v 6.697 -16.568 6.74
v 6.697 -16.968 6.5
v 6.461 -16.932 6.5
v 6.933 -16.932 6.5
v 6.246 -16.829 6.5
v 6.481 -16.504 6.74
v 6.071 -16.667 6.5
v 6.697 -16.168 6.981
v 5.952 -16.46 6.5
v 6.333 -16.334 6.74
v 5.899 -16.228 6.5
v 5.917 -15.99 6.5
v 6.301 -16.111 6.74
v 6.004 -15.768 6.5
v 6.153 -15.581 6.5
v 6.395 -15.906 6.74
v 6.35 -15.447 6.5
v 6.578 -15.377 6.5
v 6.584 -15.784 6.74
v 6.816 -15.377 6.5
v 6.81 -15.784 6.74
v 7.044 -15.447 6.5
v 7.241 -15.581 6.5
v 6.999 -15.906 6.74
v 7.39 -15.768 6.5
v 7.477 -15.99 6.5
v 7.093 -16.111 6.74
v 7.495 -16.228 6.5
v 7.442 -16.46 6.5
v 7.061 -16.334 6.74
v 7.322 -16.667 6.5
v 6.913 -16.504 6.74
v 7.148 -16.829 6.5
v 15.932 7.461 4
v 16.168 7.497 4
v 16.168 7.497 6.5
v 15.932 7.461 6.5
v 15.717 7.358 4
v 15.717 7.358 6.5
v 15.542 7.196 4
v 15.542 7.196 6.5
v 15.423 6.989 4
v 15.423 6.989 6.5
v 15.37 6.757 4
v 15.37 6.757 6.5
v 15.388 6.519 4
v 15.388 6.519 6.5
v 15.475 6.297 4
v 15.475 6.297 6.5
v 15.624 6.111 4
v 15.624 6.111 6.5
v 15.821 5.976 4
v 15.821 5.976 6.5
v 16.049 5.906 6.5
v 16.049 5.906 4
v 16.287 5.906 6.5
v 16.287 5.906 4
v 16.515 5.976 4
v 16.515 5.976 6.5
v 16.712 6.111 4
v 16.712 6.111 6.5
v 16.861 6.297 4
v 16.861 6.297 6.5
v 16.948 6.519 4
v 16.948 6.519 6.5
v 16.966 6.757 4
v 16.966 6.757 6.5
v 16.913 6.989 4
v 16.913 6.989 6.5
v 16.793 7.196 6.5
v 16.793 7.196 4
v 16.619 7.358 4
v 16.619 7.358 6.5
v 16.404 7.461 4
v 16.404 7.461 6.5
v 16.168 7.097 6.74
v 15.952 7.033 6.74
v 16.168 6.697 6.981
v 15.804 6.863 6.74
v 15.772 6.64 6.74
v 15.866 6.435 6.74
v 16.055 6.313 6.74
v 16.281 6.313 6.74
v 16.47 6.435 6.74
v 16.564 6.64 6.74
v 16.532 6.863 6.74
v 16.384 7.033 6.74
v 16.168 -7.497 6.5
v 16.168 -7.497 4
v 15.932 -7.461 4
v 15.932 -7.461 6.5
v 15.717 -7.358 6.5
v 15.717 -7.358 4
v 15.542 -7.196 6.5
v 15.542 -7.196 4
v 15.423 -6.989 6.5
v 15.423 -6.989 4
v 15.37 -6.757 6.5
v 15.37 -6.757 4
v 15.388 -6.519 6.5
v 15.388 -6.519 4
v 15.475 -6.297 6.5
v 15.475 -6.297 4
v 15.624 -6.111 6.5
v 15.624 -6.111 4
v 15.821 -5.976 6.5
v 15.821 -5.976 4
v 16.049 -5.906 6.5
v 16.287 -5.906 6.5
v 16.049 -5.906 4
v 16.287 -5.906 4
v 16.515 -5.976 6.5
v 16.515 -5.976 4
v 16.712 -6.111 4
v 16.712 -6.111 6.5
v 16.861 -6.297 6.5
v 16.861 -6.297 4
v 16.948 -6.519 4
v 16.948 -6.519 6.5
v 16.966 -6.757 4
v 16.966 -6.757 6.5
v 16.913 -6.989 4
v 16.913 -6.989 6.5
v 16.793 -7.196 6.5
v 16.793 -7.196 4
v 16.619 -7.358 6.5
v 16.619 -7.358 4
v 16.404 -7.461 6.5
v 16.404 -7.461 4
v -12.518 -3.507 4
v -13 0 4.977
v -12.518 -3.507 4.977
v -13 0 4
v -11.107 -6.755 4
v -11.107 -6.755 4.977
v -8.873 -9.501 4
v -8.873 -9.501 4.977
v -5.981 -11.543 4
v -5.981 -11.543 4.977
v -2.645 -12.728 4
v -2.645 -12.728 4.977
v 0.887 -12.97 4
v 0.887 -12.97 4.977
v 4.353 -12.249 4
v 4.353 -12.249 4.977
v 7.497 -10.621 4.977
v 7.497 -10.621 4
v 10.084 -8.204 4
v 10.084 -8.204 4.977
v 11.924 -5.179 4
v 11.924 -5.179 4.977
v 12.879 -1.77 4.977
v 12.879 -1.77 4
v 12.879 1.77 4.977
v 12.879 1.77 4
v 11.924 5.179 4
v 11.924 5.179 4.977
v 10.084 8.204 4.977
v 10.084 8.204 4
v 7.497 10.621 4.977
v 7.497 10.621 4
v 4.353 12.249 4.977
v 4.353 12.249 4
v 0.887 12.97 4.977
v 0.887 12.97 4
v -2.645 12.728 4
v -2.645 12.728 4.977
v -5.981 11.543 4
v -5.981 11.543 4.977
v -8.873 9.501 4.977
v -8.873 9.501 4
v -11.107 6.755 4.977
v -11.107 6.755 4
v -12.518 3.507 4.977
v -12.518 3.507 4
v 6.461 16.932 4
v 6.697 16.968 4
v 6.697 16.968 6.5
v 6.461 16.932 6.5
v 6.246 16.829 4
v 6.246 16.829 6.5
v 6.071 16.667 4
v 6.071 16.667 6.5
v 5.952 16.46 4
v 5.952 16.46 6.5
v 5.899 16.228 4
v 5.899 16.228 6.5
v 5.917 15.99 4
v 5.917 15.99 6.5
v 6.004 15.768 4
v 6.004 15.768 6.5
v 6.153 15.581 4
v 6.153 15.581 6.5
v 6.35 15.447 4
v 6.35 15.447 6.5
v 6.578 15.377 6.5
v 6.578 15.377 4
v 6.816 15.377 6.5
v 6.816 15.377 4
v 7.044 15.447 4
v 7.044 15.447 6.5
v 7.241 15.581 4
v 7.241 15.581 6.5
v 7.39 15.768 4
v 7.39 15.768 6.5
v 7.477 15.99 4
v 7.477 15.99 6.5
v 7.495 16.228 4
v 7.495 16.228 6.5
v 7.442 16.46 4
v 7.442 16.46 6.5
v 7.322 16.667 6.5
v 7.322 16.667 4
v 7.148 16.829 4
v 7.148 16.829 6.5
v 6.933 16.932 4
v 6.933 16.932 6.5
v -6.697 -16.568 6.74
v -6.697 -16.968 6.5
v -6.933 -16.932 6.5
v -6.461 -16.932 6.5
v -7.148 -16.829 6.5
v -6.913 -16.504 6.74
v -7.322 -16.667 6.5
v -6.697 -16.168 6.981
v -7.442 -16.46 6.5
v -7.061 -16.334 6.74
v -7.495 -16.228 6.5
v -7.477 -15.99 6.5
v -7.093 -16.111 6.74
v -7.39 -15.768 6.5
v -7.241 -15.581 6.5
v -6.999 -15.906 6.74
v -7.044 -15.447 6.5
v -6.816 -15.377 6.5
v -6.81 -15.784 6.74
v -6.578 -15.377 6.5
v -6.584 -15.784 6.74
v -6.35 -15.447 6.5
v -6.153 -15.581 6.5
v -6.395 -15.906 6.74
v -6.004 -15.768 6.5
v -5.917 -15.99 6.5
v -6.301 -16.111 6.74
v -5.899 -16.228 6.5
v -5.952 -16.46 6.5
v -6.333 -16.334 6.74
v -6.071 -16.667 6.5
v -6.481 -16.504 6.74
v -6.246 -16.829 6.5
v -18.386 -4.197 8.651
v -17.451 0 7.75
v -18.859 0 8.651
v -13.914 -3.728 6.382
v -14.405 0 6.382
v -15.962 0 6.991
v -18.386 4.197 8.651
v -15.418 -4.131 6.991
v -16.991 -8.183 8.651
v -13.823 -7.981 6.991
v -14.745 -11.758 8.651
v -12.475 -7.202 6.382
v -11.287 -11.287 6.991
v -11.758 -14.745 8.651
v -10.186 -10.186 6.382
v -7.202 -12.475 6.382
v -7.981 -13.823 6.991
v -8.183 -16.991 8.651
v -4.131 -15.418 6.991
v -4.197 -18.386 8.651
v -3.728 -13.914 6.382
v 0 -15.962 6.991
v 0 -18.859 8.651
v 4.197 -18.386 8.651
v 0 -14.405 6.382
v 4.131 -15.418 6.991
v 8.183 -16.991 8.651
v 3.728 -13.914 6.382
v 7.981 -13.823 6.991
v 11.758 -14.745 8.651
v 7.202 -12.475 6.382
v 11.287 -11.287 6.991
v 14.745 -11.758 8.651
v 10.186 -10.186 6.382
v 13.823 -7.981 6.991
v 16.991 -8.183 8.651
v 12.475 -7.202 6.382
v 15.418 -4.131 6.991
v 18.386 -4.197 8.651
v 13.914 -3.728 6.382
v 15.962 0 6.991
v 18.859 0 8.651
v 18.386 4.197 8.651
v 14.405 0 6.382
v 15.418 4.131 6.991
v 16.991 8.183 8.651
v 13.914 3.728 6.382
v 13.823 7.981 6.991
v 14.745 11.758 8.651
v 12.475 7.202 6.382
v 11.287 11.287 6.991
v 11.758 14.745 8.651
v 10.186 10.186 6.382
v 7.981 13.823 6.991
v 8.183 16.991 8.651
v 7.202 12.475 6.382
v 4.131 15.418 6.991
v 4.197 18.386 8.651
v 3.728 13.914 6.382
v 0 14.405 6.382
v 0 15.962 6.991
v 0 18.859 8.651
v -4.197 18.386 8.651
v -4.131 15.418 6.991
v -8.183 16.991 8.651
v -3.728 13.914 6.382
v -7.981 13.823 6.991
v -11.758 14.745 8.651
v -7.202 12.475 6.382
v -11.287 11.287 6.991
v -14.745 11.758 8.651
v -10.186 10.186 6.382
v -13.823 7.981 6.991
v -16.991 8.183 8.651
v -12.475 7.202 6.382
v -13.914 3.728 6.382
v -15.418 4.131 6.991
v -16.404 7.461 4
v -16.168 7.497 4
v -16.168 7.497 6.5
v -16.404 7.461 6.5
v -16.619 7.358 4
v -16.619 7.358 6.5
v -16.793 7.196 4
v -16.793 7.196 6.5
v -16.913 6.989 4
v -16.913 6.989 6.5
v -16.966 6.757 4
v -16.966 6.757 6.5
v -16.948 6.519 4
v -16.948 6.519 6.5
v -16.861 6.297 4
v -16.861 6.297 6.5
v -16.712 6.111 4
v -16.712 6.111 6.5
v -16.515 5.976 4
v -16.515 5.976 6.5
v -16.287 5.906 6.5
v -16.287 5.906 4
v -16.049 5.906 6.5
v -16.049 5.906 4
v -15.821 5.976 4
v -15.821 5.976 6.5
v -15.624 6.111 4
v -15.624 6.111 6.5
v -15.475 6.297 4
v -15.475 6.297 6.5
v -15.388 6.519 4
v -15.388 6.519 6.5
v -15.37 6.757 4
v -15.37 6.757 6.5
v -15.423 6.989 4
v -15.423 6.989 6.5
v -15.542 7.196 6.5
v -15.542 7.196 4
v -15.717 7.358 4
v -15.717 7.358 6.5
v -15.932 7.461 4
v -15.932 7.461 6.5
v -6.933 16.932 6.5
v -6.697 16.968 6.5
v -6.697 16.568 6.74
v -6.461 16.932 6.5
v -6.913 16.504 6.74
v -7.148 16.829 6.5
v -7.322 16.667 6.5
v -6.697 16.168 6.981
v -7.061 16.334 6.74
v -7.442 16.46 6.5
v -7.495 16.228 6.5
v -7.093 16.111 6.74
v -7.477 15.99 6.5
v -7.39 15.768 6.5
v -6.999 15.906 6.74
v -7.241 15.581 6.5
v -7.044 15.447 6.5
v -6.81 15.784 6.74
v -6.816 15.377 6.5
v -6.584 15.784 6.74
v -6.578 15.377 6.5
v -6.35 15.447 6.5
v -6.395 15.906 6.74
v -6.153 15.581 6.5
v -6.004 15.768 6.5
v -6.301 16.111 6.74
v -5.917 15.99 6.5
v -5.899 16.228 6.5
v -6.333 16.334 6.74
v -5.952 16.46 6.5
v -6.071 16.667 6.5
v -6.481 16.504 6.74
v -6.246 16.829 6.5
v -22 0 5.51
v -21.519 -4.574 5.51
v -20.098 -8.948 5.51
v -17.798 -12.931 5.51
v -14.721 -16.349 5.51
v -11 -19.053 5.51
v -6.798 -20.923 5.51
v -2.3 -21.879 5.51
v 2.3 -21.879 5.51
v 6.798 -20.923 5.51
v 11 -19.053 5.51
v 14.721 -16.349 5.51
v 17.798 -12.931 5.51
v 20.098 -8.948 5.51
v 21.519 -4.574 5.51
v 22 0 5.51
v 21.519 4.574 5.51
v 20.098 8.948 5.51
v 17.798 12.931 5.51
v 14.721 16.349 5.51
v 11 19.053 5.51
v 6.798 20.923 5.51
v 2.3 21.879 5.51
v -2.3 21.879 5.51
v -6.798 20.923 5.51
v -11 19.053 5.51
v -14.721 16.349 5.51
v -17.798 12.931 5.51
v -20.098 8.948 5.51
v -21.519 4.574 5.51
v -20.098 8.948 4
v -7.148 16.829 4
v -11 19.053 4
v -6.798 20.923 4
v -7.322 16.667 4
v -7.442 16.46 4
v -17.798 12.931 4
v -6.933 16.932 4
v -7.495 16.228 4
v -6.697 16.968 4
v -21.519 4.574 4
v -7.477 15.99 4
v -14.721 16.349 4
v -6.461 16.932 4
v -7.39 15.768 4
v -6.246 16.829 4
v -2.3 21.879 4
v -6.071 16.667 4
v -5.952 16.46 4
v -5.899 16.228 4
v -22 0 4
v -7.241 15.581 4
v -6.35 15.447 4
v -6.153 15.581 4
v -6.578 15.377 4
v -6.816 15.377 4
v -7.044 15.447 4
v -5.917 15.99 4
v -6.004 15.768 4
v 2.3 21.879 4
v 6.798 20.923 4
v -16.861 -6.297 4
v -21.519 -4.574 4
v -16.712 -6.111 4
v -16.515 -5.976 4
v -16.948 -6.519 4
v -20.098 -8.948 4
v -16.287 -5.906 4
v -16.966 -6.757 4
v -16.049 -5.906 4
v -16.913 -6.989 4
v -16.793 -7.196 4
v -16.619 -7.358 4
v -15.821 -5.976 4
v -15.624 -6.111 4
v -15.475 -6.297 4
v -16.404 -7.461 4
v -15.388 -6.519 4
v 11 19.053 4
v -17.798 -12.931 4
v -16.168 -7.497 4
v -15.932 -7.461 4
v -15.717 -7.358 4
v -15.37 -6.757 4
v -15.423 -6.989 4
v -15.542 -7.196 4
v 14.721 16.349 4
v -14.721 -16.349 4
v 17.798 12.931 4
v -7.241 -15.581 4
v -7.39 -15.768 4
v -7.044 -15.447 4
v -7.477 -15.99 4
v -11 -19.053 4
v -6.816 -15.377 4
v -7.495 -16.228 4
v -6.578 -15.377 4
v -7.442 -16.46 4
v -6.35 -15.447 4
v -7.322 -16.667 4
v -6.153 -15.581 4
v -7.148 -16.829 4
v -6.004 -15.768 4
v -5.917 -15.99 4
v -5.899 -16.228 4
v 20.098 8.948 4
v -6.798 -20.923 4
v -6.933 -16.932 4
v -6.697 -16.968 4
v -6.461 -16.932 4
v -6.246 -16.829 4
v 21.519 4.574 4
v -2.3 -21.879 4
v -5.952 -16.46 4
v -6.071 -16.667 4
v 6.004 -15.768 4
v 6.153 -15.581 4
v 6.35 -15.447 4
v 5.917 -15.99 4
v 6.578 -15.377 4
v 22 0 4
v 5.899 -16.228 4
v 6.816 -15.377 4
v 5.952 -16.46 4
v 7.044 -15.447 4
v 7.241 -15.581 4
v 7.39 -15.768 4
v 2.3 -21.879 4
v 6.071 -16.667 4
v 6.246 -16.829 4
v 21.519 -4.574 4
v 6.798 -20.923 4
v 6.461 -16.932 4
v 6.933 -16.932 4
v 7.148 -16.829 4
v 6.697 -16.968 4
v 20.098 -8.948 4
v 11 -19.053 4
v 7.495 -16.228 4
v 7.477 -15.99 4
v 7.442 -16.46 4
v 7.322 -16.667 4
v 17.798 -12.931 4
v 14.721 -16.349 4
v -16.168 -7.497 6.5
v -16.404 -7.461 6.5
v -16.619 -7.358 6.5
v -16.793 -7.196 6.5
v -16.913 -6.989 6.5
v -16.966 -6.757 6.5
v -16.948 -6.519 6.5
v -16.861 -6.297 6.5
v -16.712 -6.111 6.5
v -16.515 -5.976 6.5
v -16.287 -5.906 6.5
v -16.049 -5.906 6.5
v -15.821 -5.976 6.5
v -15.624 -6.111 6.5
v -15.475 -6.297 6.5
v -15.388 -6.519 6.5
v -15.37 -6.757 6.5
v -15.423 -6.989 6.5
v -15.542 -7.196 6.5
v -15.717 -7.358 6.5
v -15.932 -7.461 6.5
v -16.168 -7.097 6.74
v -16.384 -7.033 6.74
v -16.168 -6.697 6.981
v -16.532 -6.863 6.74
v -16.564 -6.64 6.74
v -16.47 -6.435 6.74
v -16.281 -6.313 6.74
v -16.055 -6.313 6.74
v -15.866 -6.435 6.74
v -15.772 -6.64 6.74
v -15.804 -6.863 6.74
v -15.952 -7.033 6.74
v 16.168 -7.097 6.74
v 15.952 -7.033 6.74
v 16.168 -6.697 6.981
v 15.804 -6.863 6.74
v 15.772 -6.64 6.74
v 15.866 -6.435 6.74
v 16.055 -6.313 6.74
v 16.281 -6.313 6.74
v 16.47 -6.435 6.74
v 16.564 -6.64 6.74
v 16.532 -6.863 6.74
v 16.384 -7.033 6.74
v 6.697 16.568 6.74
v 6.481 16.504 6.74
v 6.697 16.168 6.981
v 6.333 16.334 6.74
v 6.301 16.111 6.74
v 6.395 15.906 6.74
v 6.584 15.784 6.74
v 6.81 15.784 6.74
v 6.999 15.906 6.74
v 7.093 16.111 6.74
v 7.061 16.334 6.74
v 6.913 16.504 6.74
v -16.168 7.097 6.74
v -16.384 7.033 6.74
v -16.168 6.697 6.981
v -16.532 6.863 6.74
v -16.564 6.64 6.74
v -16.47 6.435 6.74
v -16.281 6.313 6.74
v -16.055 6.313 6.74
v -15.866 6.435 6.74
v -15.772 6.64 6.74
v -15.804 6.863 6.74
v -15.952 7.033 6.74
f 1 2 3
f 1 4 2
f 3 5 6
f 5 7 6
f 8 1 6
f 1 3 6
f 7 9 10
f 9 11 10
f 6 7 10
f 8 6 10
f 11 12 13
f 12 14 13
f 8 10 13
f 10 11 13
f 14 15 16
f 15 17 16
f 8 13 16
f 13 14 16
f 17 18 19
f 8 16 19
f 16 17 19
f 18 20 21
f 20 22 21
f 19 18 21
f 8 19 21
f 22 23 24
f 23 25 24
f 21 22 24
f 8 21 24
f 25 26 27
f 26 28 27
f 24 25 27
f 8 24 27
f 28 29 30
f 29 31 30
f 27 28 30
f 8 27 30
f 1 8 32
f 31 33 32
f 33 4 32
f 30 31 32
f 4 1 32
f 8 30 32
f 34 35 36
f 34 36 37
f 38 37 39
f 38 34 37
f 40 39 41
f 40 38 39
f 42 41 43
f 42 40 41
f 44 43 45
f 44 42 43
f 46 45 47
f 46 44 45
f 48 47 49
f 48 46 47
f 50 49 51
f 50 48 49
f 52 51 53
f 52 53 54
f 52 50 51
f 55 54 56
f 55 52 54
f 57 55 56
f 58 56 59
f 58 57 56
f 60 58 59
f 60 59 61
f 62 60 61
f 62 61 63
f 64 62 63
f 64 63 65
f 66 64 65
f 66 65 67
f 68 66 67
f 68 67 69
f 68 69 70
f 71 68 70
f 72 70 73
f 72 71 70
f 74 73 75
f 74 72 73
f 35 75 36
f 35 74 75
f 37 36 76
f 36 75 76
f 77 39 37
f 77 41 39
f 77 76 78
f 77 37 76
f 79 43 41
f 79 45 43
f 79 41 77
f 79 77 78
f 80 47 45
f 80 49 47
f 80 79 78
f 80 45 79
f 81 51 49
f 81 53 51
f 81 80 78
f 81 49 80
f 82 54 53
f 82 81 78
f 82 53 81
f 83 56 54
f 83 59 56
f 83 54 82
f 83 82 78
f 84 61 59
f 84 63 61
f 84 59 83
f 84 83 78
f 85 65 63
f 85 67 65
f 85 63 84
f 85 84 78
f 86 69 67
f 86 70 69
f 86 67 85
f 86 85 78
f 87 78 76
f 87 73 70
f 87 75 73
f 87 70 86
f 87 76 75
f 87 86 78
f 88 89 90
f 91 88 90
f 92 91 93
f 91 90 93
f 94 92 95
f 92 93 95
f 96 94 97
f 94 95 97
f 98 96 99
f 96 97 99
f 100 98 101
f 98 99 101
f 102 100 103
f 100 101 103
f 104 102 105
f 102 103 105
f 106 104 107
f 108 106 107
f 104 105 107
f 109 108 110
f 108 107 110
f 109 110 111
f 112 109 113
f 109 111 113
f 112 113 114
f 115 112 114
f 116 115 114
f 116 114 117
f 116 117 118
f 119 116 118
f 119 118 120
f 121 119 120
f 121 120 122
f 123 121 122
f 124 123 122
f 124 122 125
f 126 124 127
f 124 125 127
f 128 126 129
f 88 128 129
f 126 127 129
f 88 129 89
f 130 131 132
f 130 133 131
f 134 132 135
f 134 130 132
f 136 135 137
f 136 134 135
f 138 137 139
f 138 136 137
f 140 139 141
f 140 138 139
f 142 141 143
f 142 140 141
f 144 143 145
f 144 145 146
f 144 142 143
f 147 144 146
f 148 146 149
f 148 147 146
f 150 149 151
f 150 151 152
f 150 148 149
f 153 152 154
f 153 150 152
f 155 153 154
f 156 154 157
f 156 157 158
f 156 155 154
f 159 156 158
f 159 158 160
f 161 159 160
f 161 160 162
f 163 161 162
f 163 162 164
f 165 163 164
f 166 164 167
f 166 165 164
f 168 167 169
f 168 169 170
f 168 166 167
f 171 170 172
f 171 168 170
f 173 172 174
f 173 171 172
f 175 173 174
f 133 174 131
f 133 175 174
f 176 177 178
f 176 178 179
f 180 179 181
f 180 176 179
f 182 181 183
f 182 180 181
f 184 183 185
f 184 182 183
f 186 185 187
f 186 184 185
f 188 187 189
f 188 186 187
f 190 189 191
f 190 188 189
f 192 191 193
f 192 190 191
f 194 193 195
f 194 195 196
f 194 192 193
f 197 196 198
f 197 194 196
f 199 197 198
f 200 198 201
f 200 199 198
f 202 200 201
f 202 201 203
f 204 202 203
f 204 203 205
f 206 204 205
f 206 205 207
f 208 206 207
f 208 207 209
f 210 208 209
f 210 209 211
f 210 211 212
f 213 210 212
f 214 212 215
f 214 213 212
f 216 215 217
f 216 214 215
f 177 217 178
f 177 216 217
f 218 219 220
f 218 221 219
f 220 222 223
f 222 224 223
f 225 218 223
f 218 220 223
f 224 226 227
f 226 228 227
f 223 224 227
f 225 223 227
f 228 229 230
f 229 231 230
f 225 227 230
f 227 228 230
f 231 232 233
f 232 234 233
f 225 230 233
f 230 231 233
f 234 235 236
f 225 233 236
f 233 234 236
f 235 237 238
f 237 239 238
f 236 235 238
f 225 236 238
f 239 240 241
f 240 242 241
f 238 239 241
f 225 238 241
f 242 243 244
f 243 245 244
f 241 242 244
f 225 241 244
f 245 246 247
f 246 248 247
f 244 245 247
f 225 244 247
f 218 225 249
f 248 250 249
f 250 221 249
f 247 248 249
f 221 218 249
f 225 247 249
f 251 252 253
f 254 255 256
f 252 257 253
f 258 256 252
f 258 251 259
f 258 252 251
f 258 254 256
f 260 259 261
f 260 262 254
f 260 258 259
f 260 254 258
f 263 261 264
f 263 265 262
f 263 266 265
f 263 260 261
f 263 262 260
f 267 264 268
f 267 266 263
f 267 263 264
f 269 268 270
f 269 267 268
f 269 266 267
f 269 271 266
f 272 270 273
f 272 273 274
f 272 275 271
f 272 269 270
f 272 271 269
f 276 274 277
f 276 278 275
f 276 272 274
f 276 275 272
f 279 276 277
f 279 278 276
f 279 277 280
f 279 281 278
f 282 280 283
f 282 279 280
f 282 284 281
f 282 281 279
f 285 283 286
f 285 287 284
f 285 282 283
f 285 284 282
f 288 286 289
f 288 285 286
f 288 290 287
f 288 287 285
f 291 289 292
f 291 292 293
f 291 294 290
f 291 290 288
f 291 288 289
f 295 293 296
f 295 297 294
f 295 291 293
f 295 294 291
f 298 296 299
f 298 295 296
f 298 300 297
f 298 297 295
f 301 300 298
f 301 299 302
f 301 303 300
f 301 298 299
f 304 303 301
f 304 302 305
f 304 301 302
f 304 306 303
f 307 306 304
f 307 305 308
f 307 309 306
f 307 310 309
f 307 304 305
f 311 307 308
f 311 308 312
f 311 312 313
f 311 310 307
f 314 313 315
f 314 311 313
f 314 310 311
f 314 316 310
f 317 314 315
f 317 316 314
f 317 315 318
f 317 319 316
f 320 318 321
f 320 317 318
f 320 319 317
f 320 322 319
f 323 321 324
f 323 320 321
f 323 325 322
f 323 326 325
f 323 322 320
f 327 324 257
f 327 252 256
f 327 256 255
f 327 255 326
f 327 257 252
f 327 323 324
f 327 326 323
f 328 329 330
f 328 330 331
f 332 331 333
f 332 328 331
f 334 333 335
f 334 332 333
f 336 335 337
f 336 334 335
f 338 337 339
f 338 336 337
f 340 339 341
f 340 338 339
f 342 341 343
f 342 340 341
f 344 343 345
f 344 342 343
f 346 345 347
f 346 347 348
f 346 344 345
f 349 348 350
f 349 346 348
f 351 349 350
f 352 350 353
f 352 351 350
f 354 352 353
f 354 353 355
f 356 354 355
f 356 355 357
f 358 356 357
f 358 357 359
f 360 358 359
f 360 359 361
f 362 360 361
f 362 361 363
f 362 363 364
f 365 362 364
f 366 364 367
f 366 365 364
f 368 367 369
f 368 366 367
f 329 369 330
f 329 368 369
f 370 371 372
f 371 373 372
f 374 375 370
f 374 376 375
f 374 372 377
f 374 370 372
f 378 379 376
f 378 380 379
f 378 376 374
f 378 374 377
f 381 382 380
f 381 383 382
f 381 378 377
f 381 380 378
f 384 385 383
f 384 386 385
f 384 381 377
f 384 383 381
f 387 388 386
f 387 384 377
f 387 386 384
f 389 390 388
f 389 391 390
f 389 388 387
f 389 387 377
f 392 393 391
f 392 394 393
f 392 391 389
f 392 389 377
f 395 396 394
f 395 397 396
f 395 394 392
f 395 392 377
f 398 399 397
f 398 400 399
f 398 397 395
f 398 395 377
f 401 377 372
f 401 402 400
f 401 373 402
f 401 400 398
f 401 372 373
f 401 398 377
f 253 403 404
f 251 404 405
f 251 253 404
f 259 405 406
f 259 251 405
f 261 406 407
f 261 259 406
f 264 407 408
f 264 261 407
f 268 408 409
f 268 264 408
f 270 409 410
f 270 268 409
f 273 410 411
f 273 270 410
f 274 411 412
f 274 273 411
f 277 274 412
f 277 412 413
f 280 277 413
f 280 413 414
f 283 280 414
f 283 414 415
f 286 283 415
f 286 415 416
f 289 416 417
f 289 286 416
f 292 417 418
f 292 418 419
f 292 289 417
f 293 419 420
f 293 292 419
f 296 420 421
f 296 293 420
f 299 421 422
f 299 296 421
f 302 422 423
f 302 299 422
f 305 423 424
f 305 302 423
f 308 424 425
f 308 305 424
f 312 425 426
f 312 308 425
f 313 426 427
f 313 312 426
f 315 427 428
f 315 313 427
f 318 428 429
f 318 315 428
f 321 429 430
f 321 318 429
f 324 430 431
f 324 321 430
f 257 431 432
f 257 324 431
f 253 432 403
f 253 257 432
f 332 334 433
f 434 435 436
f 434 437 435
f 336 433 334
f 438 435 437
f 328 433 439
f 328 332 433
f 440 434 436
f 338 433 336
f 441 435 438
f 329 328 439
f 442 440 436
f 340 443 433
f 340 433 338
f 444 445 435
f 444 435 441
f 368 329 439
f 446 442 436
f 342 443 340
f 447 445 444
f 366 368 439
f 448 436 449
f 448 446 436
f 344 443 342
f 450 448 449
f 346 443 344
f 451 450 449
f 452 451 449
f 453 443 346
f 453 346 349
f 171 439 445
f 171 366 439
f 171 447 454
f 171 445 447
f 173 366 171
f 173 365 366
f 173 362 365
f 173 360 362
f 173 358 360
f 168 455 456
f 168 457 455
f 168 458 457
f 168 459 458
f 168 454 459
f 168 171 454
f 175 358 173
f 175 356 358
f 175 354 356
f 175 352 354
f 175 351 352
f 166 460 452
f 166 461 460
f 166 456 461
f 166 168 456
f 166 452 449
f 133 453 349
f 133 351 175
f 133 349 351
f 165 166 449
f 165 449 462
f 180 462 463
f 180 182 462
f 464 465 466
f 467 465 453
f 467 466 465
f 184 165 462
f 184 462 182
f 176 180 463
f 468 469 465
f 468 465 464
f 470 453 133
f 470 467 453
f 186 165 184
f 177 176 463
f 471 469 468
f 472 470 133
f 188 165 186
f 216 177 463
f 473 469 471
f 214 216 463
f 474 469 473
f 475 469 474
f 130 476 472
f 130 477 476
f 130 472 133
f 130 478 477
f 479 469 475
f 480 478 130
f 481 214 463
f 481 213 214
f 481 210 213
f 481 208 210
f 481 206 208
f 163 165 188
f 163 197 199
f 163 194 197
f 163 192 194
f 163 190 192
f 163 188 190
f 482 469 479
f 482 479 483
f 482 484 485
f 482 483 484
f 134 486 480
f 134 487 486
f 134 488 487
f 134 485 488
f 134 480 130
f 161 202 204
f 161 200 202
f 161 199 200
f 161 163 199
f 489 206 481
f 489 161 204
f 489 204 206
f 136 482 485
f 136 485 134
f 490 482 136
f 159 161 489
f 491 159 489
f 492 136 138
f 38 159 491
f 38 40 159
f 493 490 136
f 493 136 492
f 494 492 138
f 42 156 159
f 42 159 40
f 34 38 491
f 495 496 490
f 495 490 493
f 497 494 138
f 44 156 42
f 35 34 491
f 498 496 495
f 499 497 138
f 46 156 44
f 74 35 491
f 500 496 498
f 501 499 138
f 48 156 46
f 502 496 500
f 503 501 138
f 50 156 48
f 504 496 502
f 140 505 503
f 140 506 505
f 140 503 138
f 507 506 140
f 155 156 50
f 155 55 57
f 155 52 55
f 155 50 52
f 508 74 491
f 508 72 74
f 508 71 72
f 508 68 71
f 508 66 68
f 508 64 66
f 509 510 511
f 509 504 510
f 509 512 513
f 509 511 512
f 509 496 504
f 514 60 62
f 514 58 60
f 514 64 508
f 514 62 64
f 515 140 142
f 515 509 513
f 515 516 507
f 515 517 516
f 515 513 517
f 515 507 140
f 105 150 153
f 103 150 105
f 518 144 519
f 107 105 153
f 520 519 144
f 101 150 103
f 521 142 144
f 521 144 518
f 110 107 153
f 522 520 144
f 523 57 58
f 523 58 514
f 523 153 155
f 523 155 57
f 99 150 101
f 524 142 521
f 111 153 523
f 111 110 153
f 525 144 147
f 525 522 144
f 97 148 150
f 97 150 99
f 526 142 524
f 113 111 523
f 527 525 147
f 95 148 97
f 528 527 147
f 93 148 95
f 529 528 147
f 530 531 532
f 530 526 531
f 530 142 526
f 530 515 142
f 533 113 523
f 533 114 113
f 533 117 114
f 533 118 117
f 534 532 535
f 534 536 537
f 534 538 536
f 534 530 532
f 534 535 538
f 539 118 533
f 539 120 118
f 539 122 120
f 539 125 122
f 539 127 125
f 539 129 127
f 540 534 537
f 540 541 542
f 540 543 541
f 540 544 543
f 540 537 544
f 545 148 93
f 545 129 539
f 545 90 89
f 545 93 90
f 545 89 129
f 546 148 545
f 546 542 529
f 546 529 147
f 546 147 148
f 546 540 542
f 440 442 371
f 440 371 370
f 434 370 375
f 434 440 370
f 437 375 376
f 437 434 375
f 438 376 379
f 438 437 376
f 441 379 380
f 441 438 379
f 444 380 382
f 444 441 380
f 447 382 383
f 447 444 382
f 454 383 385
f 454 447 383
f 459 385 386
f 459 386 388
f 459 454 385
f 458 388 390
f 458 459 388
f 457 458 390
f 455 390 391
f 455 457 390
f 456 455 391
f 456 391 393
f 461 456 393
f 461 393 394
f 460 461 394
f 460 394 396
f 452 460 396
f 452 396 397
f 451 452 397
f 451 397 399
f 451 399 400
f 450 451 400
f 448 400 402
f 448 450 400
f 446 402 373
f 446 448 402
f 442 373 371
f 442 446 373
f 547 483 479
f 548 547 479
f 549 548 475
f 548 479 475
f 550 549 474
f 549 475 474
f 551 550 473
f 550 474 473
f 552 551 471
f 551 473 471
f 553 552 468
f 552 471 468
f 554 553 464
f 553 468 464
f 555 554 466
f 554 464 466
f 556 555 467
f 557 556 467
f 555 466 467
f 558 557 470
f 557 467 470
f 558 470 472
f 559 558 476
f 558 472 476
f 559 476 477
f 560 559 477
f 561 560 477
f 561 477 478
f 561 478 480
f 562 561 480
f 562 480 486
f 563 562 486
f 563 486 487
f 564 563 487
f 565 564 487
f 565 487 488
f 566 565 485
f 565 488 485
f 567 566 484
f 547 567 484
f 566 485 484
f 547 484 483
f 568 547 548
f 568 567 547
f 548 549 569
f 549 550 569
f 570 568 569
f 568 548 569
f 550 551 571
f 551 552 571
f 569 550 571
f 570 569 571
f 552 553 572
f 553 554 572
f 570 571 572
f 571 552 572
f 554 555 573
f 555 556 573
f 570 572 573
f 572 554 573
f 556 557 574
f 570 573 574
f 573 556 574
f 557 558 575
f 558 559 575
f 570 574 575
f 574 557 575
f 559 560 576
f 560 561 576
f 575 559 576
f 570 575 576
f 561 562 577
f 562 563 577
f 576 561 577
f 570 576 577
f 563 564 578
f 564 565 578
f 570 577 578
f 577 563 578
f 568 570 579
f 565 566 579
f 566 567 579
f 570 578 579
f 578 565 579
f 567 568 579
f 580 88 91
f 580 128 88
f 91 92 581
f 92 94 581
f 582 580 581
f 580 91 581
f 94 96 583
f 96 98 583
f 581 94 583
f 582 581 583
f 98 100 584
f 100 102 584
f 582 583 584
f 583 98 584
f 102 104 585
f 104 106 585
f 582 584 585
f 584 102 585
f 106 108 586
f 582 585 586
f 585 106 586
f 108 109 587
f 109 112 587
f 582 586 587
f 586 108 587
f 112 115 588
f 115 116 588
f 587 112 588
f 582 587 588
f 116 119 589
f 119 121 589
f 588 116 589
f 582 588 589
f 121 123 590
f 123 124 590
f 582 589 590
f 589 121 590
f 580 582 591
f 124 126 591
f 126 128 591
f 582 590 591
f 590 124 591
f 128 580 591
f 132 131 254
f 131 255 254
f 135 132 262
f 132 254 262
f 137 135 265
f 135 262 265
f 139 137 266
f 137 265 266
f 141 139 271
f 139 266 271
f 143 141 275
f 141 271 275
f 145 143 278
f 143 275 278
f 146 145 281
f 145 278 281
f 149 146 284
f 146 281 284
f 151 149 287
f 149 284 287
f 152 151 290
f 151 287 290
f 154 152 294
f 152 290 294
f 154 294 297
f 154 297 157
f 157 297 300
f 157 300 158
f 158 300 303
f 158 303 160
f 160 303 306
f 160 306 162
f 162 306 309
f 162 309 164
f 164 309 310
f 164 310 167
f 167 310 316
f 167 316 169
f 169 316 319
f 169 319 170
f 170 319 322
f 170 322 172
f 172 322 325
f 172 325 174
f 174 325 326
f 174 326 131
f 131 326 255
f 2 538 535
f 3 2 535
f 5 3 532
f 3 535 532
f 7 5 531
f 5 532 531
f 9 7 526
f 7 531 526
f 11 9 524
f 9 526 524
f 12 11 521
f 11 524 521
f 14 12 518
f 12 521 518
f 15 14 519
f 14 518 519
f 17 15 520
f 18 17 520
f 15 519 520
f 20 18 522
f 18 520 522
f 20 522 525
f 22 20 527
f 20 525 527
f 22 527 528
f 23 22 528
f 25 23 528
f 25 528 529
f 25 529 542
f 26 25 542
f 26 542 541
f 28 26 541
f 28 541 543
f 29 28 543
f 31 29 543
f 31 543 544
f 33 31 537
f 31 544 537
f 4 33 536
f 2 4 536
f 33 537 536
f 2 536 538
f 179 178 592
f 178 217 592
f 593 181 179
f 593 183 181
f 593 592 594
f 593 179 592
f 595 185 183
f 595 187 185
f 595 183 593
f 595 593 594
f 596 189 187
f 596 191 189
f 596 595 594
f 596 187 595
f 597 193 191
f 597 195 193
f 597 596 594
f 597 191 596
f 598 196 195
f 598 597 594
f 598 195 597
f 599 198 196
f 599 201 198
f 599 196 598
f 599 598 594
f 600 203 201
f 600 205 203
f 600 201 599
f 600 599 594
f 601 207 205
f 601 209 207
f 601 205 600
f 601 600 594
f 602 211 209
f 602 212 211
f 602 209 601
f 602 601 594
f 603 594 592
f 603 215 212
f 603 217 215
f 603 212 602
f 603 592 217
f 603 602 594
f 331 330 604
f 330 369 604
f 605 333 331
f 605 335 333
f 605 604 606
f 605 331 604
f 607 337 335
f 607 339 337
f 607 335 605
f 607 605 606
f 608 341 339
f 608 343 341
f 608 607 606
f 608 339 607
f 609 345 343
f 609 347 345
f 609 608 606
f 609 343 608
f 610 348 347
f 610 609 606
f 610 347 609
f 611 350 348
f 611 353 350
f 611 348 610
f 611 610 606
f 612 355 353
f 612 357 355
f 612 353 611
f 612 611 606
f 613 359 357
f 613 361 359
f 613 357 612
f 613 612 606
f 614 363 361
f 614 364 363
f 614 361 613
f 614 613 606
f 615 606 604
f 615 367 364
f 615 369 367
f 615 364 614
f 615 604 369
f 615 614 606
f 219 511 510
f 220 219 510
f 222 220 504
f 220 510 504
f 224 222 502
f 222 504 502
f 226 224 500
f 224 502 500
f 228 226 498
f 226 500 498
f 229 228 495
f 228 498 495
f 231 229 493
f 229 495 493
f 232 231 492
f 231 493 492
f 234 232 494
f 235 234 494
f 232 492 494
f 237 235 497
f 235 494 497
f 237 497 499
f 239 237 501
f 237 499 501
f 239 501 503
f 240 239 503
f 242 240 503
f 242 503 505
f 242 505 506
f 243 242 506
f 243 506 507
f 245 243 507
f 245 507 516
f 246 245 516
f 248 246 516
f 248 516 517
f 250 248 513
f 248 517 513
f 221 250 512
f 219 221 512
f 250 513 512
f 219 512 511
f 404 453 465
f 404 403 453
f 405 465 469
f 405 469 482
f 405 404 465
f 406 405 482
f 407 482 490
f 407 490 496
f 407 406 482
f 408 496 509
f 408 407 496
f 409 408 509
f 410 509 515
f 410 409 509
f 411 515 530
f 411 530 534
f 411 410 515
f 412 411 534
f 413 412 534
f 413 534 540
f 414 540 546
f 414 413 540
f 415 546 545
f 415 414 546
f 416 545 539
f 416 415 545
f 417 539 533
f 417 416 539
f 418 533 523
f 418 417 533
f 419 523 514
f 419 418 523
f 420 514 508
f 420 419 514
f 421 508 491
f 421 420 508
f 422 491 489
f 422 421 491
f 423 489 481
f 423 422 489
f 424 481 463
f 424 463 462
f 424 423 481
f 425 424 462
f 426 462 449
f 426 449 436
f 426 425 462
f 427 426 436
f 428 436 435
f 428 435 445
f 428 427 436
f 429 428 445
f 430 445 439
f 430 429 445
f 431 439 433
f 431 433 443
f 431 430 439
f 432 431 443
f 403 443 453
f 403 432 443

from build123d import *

# Parameters (mm, degrees)
FORMSENKUNG_F_R_M3_SENKSCHRAUBE_MIT_2_COUNT = 2
FORMSENKUNG_F_R_M3_SENKSCHRAUBE_MIT_2_PITCH = 24.748737342
FORMSENKUNG_F_R_M3_SENKSCHRAUBE_MIT_3_COUNT = 2
FORMSENKUNG_F_R_M3_SENKSCHRAUBE_MIT_3_PITCH = 13.393920133
FORMSENKUNG_F_R_M3_SENKSCHRAUBE_MIT_4_COUNT = 2
FORMSENKUNG_F_R_M3_SENKSCHRAUBE_MIT_4_PITCH = 13.393920133
FASE2_SIZE                                  = 1


with BuildPart() as part:
    # Skizze2 → Rotation1 (revolve)
    with BuildSketch(Plane(origin=(0, 0, 0), x_dir=(0, 0, -1), z_dir=(1, 0, 0)), mode=Mode.PRIVATE) as rotation1_sk:
        with BuildLine():
            Line((-4, 22), (-5.510050506, 22))
            Line((-5.510050506, 22), (-8.650908847, 18.859141659))
            ThreePointArc((-8.650908847, 18.859141659), (-7.034102467, 16.057337565), (-5.977288358, 13))
            Line((-5.977288358, 13), (-4, 13))
            Line((-4, 13), (-4, 22))
        make_face()
    revolve(rotation1_sk.sketch.rotate(Axis((0, 0, 0), (0, 0, 1)), 90), axis=Axis((0, 0, 0), (0, 0, 1)))

    # Skizze4 → Formsenkung für M3 Senkschraube mit Innensechskant1 (revolve, cut)
    with BuildSketch(Plane(origin=(-6.696960066, 16.167891819, -5.5), x_dir=(0, 1, 0), z_dir=(1, 0, 0))):
        Polygon((0, 0), (0, 12.480688495), (0.8, 12), (0.8, 1.15), (1.95, 0), align=None)
    formsenkung_f_r_m3_senkschraube_mit_inne = revolve(axis=Axis((-6.696960066, 16.167891819, -11.85), (0, 0, 1)), mode=Mode.SUBTRACT)

    # Formsenkung f_r M3 Senkschraube mit  2: Formsenkung für M3 Senkschraube mit Innensechskant1 ×2
    with Locations(*[Vector(0.9238795325112864, -0.3826834323650907, 0) * (i * FORMSENKUNG_F_R_M3_SENKSCHRAUBE_MIT_2_PITCH) for i in range(1, FORMSENKUNG_F_R_M3_SENKSCHRAUBE_MIT_2_COUNT)]):
        add(formsenkung_f_r_m3_senkschraube_mit_inne, mode=Mode.SUBTRACT)

    # Formsenkung f_r M3 Senkschraube mit  3: Formsenkung für M3 Senkschraube mit Innensechskant1 ×2
    with Locations(*[(i * FORMSENKUNG_F_R_M3_SENKSCHRAUBE_MIT_3_PITCH, 0, 0) for i in range(1, FORMSENKUNG_F_R_M3_SENKSCHRAUBE_MIT_3_COUNT)]):
        add(formsenkung_f_r_m3_senkschraube_mit_inne, mode=Mode.SUBTRACT)

    # Formsenkung f_r M3 Senkschraube mit  4: Formsenkung für M3 Senkschraube mit Innensechskant1 ×2
    with Locations(*[Vector(-0.7071067811865511, -0.707106781186544, 0) * (i * FORMSENKUNG_F_R_M3_SENKSCHRAUBE_MIT_4_PITCH) for i in range(1, FORMSENKUNG_F_R_M3_SENKSCHRAUBE_MIT_4_COUNT)]):
        add(formsenkung_f_r_m3_senkschraube_mit_inne, mode=Mode.SUBTRACT)

    # Spiegeln1: Formsenkung für M3 Senkschraube mit Innensechskant1 across plane
    add(formsenkung_f_r_m3_senkschraube_mit_inne.mirror(Plane.ZX), mode=Mode.SUBTRACT)

    # Spiegeln1 copy 1 sketch → Spiegeln1 copy 1 (revolve, cut)
    with BuildSketch(Plane(origin=(16.167891819, -6.696960066, -5.5), x_dir=(0, -1, 0), z_dir=(1, 0, 0))):
        Polygon((0, 0), (0, -12.480688495), (0.8, -12), (0.8, -1.15), (1.95, 0), align=None)
    revolve(axis=Axis((16.167891819, -6.696960066, -11.85), (0, 0, -1)), mode=Mode.SUBTRACT)

    # Spiegeln1 copy 2 sketch → Spiegeln1 copy 2 (revolve, cut)
    with BuildSketch(Plane(origin=(6.696960066, -16.167891819, -5.5), x_dir=(0, -1, 0), z_dir=(1, 0, 0))):
        Polygon((0, 0), (0, -12.480688495), (0.8, -12), (0.8, -1.15), (1.95, 0), align=None)
    revolve(axis=Axis((6.696960066, -16.167891819, -11.85), (0, 0, -1)), mode=Mode.SUBTRACT)

    # Spiegeln1 copy 3 sketch → Spiegeln1 copy 3 (revolve, cut)
    with BuildSketch(Plane(origin=(-16.167891819, -6.696960066, -5.5), x_dir=(0, -1, 0), z_dir=(1, 0, 0))):
        Polygon((0, 0), (0, -12.480688495), (0.8, -12), (0.8, -1.15), (1.95, 0), align=None)
    revolve(axis=Axis((-16.167891819, -6.696960066, -11.85), (0, 0, -1)), mode=Mode.SUBTRACT)

    # Fase2
    # the kernel refuses this chamfer: 1.357533455, 1 mm, written as the material it takes off along each edge
    with BuildSketch(Plane(origin=(0, 0, 5.977288358), x_dir=(-1, 0, 0), z_dir=(0, 1, 0))) as fase2_piece_1:
        with BuildLine():
            Line((13, -FASE2_SIZE), (14.404750469, 0.404750469))
            ThreePointArc((14.404750469, 0.404750469), (13.729596576, 0.193874689), (13, 0))
            Line((13, 0), (13, -FASE2_SIZE))
        make_face()
    revolve(axis=Axis((0, 0, 5.977288358), (0, 0, 1)), mode=Mode.SUBTRACT)


solid = part.part
